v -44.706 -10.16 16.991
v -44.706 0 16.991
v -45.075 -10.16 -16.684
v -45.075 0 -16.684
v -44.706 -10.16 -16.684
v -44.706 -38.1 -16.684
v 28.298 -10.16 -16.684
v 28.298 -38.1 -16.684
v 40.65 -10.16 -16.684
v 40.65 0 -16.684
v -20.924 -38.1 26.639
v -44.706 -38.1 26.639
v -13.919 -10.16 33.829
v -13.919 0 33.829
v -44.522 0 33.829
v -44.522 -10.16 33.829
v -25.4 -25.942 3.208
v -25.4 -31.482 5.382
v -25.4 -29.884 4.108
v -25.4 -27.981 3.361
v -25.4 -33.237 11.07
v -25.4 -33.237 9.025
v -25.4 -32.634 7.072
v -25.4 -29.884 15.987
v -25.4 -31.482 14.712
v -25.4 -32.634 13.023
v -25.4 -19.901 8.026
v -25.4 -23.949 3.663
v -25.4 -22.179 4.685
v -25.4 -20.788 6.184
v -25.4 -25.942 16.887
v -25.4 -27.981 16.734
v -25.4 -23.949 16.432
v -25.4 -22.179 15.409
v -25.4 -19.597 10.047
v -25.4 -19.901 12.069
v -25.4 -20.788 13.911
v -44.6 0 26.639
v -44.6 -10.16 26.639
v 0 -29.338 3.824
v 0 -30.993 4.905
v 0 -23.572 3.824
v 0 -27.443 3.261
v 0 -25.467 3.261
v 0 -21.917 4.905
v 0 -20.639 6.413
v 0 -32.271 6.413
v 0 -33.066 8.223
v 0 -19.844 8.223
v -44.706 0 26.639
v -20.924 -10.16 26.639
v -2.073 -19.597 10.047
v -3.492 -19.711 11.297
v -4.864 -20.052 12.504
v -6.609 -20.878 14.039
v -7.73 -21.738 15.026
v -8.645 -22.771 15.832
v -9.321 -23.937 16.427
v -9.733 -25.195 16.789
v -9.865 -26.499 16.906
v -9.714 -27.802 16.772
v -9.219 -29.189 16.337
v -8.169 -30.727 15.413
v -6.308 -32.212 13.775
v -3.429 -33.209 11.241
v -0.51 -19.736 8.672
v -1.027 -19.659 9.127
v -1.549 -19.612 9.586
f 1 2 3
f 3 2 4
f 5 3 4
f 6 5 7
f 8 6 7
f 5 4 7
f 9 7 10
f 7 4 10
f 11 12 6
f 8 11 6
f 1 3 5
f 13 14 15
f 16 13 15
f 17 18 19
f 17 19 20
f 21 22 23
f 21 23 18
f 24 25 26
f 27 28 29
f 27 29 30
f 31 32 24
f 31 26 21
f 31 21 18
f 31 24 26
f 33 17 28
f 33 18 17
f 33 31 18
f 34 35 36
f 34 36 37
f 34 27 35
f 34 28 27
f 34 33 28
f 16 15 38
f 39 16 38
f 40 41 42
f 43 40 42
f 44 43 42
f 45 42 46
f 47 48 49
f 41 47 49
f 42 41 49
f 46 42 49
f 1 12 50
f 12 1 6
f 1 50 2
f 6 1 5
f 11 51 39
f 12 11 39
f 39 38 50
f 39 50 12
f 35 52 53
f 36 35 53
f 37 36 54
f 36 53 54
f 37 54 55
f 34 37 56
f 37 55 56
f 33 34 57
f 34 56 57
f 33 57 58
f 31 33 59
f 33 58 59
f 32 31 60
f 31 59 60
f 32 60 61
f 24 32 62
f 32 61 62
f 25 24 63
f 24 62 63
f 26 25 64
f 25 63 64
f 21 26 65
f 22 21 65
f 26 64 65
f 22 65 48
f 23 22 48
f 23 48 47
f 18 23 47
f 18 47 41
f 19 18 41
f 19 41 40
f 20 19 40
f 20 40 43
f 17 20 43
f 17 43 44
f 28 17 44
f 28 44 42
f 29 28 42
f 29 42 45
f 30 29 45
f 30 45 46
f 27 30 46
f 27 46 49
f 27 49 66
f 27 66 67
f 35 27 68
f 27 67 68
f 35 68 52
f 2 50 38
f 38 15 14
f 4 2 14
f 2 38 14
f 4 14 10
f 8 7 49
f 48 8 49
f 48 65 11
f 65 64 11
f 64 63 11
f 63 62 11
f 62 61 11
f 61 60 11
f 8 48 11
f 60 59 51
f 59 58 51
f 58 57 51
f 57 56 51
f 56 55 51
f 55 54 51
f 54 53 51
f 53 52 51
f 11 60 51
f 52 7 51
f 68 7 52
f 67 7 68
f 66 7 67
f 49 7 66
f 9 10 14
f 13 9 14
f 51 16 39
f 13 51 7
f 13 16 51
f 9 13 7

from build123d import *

# Parameters (mm, degrees)
F1_DEPTH = 10.16
F3_DEPTH = 38.1
F4_R     = 6.858397
F5_DEPTH = 25.4


with BuildPart() as f1:
    # F0 (on Front) → F1 (new body)
    with BuildSketch(Plane.XZ):
        Polygon((-13.918791, 33.829112), (-44.521693, 33.829112), (-45.074757, -16.684113), (40.650241, -16.684113), align=None)
    extrude(amount=F1_DEPTH)

    # F2 (on Front) → F3 (join)
    with BuildSketch(Plane.XZ):
        Polygon((-20.924274, 26.639275), (-44.70605, 26.639275), (-44.70605, -16.684113), (28.298469, -16.684113), align=None)
    extrude(amount=F3_DEPTH)

    # F4 (on Right) → F5 (cut)
    with BuildSketch(Plane.YZ):
        with Locations((-26.45492, 10.047339)):
            Circle(F4_R)
    extrude(amount=-F5_DEPTH, mode=Mode.SUBTRACT)


solid = f1.part
